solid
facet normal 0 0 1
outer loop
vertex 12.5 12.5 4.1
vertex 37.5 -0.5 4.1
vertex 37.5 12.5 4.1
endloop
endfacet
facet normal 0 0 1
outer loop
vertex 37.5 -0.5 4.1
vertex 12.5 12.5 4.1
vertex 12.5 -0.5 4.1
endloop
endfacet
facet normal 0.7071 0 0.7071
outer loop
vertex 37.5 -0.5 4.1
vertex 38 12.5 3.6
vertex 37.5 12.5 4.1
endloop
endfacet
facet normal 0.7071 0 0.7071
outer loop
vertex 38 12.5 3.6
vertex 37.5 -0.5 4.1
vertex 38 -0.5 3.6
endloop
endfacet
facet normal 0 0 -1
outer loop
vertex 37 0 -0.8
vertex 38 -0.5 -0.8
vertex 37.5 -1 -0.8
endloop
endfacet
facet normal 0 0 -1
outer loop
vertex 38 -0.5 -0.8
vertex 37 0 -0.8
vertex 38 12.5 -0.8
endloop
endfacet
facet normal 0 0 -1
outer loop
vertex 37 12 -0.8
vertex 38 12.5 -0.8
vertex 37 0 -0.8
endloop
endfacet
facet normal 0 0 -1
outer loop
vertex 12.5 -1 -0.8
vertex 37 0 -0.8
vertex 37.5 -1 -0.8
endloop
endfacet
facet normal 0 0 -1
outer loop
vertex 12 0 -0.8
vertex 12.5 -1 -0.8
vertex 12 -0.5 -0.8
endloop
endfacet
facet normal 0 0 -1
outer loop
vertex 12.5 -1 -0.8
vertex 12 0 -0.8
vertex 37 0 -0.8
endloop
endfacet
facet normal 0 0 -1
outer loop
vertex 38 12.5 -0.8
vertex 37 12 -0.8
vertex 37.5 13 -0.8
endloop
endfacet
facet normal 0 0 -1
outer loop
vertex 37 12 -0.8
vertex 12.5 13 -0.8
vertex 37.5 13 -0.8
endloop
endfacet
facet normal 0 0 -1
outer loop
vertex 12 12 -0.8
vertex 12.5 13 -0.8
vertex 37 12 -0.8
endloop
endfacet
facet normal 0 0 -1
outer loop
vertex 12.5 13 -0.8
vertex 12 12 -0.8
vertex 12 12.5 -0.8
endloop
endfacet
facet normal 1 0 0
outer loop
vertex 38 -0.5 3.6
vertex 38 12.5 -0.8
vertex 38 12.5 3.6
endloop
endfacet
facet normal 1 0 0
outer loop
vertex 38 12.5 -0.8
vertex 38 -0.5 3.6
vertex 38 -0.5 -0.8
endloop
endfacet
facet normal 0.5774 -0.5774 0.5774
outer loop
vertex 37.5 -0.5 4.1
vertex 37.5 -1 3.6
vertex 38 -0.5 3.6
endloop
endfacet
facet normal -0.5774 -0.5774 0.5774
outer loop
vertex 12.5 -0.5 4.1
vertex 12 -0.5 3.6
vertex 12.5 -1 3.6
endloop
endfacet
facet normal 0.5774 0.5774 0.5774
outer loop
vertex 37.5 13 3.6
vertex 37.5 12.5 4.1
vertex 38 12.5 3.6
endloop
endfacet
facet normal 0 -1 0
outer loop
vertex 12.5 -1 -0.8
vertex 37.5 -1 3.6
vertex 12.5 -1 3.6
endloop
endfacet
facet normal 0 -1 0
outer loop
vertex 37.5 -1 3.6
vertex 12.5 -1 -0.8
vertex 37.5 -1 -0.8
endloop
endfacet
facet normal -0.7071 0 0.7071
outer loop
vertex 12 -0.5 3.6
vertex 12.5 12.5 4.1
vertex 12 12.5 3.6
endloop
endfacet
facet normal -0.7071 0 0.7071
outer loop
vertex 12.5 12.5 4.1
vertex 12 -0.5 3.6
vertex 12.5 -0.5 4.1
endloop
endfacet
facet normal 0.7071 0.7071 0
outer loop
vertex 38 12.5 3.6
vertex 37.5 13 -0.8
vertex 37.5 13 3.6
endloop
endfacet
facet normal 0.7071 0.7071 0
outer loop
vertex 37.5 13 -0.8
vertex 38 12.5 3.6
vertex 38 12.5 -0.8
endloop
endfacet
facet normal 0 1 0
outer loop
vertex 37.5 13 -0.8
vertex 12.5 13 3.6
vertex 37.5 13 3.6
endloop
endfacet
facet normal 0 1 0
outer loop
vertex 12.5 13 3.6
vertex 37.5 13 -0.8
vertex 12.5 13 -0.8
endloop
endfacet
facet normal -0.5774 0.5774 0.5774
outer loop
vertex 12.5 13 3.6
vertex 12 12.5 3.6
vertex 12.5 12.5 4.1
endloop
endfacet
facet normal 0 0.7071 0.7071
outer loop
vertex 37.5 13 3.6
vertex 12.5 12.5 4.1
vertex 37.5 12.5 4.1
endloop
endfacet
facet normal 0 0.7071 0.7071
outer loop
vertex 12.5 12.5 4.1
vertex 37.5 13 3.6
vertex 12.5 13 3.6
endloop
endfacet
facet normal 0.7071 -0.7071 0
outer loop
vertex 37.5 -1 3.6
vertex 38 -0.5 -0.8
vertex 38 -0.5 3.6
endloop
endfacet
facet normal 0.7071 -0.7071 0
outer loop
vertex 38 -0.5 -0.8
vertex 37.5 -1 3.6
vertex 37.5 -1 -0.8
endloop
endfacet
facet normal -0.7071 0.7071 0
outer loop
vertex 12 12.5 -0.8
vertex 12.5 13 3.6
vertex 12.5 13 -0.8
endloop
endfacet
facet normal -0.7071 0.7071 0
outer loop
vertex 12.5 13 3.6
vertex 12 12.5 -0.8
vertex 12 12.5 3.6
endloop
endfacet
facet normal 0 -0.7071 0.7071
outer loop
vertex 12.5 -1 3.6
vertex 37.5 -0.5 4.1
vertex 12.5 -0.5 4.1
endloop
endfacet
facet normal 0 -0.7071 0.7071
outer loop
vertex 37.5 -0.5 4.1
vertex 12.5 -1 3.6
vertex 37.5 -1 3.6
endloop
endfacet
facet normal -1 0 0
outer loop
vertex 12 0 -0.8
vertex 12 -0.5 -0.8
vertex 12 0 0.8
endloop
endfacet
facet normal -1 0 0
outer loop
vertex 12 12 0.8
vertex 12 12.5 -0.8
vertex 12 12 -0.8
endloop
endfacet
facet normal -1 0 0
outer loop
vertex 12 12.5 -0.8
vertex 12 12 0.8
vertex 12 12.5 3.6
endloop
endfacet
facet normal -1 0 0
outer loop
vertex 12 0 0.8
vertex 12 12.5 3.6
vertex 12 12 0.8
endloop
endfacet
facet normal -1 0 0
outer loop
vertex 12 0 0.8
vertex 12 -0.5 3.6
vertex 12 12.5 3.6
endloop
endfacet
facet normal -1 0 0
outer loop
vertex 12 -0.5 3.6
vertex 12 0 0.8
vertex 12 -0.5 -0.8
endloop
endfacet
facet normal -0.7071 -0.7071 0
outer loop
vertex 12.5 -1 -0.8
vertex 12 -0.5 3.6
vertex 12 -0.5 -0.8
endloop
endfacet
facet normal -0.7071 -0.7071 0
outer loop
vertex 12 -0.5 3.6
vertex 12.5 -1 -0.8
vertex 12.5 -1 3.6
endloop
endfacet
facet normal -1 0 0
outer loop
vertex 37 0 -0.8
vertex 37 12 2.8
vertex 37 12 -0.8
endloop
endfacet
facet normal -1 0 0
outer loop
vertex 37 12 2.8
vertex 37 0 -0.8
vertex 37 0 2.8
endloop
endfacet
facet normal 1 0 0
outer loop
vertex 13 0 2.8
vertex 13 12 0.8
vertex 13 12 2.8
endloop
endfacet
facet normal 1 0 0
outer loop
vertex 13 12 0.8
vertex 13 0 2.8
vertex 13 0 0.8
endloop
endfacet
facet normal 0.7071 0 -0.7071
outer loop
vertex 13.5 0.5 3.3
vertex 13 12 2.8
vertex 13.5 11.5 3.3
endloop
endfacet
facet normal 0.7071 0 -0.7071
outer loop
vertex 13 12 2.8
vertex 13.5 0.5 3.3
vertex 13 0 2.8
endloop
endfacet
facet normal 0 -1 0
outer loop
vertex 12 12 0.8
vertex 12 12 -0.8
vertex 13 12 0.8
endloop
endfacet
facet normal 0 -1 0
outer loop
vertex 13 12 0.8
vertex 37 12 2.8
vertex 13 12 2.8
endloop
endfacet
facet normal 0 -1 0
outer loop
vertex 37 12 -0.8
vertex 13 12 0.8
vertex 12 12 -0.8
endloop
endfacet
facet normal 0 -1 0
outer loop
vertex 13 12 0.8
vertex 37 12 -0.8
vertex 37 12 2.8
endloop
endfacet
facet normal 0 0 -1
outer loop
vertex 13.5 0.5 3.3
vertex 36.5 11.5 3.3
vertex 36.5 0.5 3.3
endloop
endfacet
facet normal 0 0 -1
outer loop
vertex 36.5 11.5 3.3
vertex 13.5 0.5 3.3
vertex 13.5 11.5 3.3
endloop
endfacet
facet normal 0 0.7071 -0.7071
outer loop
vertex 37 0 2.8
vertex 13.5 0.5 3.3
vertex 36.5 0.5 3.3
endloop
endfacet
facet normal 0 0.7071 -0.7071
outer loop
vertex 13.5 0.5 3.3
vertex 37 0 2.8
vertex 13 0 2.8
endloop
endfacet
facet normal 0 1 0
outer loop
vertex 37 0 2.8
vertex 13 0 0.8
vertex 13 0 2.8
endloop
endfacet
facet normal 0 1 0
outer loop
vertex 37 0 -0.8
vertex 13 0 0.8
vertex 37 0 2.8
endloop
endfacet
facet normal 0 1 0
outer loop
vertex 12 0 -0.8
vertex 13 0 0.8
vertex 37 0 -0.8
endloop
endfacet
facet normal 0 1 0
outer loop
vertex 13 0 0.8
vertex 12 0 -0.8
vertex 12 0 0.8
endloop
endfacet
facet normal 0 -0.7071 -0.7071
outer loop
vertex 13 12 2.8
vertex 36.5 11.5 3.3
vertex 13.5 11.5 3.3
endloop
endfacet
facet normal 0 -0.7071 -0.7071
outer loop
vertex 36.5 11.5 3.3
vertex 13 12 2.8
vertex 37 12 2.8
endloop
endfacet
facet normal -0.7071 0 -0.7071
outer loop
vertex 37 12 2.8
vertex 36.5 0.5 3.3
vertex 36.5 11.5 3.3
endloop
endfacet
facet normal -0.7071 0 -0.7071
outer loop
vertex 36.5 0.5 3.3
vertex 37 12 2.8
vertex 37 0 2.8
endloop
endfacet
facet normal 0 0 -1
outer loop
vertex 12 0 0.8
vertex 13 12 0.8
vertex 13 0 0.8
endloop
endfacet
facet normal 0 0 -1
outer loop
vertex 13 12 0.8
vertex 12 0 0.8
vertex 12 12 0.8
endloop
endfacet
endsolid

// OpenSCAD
/**
 * Martin Egli
 * 2024-01-23
 * transparent case for usb-tiny-aaaf5050
 */
// version 1.1
module buttonPTS526(col = "Silver", loc_res = 32) {
    // origin in the middle, at the bottom
    color(col) {
        hull() {
            translate([-3/2, -4.8/2, 0])
            cube([3, 4.8, 1]);
            translate([-4.8/2, -3/2, 0])
            cube([4.8, 3, 1]);
        }
        translate([0, 0, 0])
        cylinder(d =2, h = 1.5, $fn = loc_res);
    }
}

module pcbTinyUSBAAAF5050(loc_res = 32) {
    // pcb
    color("Green")
    translate([0, 0, 0])
    cube([35, 12, 1.6]);
    // USB contacts
    color("Silver")
    translate([1, 8.7, 1.6])
    cube([7.6, 1.6, 0.1]);
    color("Silver")
    translate([2, 6.5, 1.6])
    cube([6.5, 1.1, 0.1]);
    color("Silver")
    translate([2, 4.5, 1.6])
    cube([6.5, 1.1, 0.1]);
    color("Silver")
    translate([1, 1.7, 1.6])
    cube([7.6, 1.6, 0.1]);
    // white line: case may start here
    color("White")
    translate([12, 0, -0.1])
    cube([0.1, 12, 1.6+0.2]);
    // ATTiny85 and LDO
    color("Black")
    translate([17.3, 6.5, 1.6])
    cube([5.2, 5.4, 1.2]);
    color("Black")
    translate([17.5, 0.4, 1.6])
    cube([1.7, 3.0, 1]);
    // LED1
    color("White")
    translate([26, 3.5, 1.6])
    cube([5, 5, 1.6]);
    // LED2, over the right edge
    color("White")
    translate([35, 3.5, -2.5+1.6/2])
    cube([1.6, 5, 5]);
    // LED3 on bottom
    color("White")
    translate([26, 3.5, -1.6])
    cube([5, 5, 1.6]);
    // button on bottom
    translate([18, 6, 0])
    rotate([0, 180, 0])
    buttonPTS526("Silver", loc_res);
}

module caseTop(show_pcb = 1, th = 1, loc_res = 32) {
    if(show_pcb) {
        translate([0, 0, -1.6/2])
        pcbTinyUSBAAAF5050();
    }
    // overall height compensation for 1/2 pcb thickness
    translate([0, 0, 1.6/2]) {
        difference() {
            union() {
                hull() {
                    translate([12, -0.5, -1.6])
                    cube([24+2, 12+1, 4+.4]);
                    translate([12.5, -1, -1.6])
                    cube([24+1, 12+2, 4+.4]);
                    translate([12.5, -0.5, -1.6])
                    cube([24+1, 12+1, 4.5+.4]);
                }
            }
            hull() {
                translate([13, 0, -2])
                cube([24, 12, 4]);
                translate([13.5, 0.5, -1])
                cube([24-1, 12-1, 3.5]);
            }
            translate([-1, 0, -2])
            cube([24, 12, 2]);
            // look inside
            *translate([-1, -2, -5])
            cube([48, 6, 10]);
        }
    }      
}

module caseBottom(show_pcb = 1, th = 1, loc_res = 32) {
    if(show_pcb) {
        translate([0, 0, -1.6/2])
        pcbTinyUSBAAAF5050();
    }
    // overall height compensation for 1/2 pcb thickness
    translate([0, 0, -1.6/2]) {
        difference() {
            union() {
                // USB Spacer -> 1.6 + 0.4 mm = 2.0 mm
                translate([0, 0, -0.4])
                cube([13, 12, 0.4]);
                hull() {
                    translate([12.5, -1, -2.5])
                    cube([26-1, 14, 2.5]);
                    translate([12, -0.5, -2.5])
                    cube([26, 14-1, 2.5]);
                    translate([12.5, -0.5, -3])
                    cube([26-1, 14-1, 3]);
                }
            }
            hull() {
                translate([13, 0, -1.5])
                cube([24, 12, 2]);
                translate([13.5, 0.5, -2])
                cube([24-1, 12-1, 2]);
            }
            // button cut out
            translate([15, 3, -4])
            cube([6, .2, 6]);
            translate([15, 9, -4])
            cube([6, .2, 6]);
            translate([21, 3, -4])
            cube([.2, 6.2, 6]);
            // look inside
            *translate([-1, -2, -5])
            cube([48, 6, 10]);
        }
        
    }       
}
caseTop(0);
*caseBottom(0);
